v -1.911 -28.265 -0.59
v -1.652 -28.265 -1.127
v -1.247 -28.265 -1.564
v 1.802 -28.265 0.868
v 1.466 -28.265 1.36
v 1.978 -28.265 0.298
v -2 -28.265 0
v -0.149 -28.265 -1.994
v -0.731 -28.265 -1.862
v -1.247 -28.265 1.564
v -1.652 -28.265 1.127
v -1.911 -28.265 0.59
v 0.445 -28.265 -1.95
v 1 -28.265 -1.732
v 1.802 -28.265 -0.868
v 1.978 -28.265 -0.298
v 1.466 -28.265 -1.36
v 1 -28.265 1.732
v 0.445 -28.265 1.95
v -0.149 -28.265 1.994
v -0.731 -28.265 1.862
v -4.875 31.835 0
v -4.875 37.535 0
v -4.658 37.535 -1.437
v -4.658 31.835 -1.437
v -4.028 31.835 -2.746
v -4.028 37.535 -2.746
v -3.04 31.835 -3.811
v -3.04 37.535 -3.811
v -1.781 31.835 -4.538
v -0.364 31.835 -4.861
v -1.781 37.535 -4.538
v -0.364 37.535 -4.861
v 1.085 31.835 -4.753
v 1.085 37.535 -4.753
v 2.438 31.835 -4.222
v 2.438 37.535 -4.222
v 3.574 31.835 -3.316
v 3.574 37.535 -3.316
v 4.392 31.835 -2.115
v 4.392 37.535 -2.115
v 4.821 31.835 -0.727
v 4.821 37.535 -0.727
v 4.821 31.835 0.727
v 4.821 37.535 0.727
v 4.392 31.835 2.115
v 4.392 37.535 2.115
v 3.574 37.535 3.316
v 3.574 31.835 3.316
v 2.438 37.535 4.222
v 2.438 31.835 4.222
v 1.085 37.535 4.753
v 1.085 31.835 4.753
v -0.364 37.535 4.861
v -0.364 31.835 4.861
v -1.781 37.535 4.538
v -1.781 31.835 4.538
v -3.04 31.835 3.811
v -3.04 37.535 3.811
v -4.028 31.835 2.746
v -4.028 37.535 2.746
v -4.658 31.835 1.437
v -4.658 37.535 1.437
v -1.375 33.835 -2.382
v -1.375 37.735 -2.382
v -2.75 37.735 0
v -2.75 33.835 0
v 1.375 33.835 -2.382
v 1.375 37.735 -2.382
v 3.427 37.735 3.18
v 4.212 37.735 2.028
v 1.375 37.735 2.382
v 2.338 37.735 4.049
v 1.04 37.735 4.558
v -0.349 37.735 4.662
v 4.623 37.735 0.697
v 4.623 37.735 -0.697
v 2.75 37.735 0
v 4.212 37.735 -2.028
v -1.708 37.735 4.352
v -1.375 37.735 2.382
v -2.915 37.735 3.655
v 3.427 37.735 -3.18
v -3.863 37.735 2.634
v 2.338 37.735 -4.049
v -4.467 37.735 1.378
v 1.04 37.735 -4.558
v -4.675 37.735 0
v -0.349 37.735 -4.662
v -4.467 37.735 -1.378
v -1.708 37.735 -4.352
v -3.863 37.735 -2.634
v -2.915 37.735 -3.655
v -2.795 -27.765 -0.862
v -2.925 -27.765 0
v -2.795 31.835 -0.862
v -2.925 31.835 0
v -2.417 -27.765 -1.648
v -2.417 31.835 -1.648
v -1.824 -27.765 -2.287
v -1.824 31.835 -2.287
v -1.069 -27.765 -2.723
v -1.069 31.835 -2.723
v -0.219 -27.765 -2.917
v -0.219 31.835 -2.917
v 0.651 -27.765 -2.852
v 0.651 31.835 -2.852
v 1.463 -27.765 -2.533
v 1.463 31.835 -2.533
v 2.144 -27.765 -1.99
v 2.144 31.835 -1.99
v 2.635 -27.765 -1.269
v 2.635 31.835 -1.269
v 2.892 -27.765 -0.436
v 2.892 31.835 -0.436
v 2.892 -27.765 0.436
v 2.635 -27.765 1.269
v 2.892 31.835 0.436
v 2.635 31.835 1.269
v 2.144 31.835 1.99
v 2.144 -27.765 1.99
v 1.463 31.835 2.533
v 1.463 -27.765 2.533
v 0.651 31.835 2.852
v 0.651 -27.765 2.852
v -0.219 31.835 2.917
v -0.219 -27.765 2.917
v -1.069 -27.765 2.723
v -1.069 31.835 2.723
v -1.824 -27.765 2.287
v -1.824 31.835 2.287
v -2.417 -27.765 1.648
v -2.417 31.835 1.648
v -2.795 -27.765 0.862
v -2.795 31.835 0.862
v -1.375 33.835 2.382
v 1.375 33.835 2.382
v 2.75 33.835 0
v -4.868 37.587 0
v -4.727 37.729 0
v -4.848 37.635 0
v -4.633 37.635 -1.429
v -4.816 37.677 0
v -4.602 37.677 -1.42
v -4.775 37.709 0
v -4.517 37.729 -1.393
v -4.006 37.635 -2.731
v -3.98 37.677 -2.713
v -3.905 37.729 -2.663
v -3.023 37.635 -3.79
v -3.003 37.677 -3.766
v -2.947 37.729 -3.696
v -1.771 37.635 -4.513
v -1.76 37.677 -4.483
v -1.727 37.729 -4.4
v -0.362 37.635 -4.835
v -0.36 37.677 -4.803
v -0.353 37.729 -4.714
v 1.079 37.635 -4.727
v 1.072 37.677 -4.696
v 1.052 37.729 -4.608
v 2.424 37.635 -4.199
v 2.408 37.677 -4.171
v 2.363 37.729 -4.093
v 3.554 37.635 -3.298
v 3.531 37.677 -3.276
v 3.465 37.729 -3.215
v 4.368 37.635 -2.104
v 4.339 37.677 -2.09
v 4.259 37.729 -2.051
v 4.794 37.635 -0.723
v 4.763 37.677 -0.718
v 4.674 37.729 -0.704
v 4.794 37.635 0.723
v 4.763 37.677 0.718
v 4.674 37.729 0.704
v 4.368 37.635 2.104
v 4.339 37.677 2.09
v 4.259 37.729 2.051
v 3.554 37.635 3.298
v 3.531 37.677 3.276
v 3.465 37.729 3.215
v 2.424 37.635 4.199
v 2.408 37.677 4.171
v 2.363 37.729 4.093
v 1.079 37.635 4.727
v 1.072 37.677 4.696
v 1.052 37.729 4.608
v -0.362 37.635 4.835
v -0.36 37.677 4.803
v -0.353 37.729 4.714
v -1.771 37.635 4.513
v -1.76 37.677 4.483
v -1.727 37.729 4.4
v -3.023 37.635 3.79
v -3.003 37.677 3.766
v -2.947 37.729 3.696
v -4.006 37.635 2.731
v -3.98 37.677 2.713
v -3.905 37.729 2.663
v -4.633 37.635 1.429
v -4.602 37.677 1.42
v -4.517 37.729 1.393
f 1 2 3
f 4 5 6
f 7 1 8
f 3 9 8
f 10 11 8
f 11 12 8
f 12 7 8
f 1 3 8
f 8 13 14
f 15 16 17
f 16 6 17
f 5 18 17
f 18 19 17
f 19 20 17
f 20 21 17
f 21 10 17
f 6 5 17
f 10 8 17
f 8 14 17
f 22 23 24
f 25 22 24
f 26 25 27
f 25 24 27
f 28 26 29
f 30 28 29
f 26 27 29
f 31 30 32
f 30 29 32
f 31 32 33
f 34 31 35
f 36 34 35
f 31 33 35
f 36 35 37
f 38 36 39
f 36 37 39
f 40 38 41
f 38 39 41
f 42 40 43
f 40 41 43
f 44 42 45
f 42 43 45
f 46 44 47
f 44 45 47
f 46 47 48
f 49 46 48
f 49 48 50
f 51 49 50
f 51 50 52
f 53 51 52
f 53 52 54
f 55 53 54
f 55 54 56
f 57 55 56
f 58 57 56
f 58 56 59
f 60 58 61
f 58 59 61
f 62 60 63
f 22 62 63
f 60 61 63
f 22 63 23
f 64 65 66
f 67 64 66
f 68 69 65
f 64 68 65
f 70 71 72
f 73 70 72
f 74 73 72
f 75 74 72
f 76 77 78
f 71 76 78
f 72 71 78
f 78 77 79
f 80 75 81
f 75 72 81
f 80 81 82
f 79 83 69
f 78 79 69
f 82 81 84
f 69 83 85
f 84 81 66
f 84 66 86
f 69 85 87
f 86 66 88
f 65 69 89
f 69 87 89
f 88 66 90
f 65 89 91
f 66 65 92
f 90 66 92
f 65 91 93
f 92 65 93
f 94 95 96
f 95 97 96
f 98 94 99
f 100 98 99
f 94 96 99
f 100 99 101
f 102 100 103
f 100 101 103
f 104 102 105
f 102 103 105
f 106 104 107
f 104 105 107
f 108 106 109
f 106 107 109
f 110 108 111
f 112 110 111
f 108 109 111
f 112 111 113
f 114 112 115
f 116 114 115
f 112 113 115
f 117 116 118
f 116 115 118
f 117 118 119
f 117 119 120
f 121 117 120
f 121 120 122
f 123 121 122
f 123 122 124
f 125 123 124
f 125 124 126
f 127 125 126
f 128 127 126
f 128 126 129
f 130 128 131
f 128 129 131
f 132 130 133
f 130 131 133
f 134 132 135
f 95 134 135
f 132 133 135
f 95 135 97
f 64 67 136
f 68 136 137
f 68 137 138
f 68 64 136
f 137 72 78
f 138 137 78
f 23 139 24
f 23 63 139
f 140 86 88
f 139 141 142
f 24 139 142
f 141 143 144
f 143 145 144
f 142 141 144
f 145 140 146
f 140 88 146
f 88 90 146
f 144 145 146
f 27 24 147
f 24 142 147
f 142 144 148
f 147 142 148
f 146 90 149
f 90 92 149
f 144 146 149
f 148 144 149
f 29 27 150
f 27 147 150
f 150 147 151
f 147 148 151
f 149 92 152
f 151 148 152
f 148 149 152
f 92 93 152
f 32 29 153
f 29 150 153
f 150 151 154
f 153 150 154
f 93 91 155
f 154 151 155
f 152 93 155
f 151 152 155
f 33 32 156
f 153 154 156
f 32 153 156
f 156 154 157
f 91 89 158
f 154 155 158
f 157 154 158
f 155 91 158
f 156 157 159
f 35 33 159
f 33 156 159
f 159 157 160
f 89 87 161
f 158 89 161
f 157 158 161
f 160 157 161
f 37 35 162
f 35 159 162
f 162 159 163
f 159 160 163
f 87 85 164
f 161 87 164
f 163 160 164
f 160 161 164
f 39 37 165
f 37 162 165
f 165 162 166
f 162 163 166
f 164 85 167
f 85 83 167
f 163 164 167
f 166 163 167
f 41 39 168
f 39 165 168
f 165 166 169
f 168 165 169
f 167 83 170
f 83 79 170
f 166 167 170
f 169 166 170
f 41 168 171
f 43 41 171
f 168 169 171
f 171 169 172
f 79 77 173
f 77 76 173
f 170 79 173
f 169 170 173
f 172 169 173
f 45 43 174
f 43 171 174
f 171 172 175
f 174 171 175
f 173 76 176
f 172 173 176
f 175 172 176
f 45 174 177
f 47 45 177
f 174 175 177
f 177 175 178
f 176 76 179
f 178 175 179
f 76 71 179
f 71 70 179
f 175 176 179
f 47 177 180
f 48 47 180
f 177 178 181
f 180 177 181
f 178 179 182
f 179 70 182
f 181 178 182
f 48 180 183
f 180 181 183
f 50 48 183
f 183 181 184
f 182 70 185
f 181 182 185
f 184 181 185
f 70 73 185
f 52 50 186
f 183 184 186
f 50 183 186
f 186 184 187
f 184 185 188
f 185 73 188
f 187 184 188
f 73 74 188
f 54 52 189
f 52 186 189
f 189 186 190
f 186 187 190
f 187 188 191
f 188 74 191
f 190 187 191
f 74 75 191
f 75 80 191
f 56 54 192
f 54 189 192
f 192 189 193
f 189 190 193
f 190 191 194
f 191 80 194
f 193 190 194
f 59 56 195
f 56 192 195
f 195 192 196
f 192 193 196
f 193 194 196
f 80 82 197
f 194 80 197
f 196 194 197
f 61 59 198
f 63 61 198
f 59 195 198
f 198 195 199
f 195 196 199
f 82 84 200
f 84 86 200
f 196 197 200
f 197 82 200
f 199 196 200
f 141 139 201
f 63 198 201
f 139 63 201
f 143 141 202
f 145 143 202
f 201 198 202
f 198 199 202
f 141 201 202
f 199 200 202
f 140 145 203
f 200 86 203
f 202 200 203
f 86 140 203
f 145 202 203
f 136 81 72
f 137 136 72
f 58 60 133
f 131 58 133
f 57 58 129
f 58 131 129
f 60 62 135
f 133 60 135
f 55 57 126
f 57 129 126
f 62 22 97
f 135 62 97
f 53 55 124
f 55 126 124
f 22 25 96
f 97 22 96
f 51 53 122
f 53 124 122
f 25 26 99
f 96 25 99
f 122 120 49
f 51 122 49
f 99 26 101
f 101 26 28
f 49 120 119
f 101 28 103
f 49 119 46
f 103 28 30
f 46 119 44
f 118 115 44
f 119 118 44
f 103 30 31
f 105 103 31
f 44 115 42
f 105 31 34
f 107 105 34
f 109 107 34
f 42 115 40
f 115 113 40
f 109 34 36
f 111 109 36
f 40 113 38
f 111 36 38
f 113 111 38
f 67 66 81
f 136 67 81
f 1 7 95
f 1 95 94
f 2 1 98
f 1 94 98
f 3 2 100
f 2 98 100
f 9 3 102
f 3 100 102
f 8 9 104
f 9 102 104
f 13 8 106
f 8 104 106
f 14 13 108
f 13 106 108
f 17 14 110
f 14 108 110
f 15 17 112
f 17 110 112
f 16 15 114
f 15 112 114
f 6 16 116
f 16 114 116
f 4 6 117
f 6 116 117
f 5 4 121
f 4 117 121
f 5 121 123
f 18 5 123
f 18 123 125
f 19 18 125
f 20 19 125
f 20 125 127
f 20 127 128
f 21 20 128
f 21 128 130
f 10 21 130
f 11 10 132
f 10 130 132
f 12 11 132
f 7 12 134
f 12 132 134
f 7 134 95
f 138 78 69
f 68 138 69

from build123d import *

# Parameters (mm, degrees)
CORTAR_EXTRUIR1_DEPTH = 3.9
REDONDEO1_R           = 0.2


with BuildPart() as part:
    # Croquis1 → Revolución1 (revolve)
    with BuildSketch(Plane.XY):
        Polygon((0, 37.735435589), (0, -28.264564411), (-2, -28.264564411), (-2.925, -27.764564411), (-2.925, 31.835435589), (-4.875, 31.835435589), (-4.875, 37.735435589), align=None)
    revolve(axis=Axis((0, 37.735435589, 0), (0, -1, 0)))

    # Croquis2 → Cortar-Extruir1 (cut)
    with BuildSketch(Plane(origin=(0, 37.735435589, 0), x_dir=(1, 0, 0), z_dir=(0, 1, 0))):
        Polygon((2.75, 0), (1.375, 2.38156986), (-1.375, 2.38156986), (-2.75, 0), (-1.375, -2.38156986), (1.375, -2.38156986), align=None)
    extrude(amount=-CORTAR_EXTRUIR1_DEPTH, mode=Mode.SUBTRACT)

    # Redondeo1
    redondeo1_edges = [part.edges().sort_by_distance(p)[0] for p in [
        (4.875, 37.735435589, 0),
    ]]
    fillet(redondeo1_edges, radius=REDONDEO1_R)


solid = part.part
